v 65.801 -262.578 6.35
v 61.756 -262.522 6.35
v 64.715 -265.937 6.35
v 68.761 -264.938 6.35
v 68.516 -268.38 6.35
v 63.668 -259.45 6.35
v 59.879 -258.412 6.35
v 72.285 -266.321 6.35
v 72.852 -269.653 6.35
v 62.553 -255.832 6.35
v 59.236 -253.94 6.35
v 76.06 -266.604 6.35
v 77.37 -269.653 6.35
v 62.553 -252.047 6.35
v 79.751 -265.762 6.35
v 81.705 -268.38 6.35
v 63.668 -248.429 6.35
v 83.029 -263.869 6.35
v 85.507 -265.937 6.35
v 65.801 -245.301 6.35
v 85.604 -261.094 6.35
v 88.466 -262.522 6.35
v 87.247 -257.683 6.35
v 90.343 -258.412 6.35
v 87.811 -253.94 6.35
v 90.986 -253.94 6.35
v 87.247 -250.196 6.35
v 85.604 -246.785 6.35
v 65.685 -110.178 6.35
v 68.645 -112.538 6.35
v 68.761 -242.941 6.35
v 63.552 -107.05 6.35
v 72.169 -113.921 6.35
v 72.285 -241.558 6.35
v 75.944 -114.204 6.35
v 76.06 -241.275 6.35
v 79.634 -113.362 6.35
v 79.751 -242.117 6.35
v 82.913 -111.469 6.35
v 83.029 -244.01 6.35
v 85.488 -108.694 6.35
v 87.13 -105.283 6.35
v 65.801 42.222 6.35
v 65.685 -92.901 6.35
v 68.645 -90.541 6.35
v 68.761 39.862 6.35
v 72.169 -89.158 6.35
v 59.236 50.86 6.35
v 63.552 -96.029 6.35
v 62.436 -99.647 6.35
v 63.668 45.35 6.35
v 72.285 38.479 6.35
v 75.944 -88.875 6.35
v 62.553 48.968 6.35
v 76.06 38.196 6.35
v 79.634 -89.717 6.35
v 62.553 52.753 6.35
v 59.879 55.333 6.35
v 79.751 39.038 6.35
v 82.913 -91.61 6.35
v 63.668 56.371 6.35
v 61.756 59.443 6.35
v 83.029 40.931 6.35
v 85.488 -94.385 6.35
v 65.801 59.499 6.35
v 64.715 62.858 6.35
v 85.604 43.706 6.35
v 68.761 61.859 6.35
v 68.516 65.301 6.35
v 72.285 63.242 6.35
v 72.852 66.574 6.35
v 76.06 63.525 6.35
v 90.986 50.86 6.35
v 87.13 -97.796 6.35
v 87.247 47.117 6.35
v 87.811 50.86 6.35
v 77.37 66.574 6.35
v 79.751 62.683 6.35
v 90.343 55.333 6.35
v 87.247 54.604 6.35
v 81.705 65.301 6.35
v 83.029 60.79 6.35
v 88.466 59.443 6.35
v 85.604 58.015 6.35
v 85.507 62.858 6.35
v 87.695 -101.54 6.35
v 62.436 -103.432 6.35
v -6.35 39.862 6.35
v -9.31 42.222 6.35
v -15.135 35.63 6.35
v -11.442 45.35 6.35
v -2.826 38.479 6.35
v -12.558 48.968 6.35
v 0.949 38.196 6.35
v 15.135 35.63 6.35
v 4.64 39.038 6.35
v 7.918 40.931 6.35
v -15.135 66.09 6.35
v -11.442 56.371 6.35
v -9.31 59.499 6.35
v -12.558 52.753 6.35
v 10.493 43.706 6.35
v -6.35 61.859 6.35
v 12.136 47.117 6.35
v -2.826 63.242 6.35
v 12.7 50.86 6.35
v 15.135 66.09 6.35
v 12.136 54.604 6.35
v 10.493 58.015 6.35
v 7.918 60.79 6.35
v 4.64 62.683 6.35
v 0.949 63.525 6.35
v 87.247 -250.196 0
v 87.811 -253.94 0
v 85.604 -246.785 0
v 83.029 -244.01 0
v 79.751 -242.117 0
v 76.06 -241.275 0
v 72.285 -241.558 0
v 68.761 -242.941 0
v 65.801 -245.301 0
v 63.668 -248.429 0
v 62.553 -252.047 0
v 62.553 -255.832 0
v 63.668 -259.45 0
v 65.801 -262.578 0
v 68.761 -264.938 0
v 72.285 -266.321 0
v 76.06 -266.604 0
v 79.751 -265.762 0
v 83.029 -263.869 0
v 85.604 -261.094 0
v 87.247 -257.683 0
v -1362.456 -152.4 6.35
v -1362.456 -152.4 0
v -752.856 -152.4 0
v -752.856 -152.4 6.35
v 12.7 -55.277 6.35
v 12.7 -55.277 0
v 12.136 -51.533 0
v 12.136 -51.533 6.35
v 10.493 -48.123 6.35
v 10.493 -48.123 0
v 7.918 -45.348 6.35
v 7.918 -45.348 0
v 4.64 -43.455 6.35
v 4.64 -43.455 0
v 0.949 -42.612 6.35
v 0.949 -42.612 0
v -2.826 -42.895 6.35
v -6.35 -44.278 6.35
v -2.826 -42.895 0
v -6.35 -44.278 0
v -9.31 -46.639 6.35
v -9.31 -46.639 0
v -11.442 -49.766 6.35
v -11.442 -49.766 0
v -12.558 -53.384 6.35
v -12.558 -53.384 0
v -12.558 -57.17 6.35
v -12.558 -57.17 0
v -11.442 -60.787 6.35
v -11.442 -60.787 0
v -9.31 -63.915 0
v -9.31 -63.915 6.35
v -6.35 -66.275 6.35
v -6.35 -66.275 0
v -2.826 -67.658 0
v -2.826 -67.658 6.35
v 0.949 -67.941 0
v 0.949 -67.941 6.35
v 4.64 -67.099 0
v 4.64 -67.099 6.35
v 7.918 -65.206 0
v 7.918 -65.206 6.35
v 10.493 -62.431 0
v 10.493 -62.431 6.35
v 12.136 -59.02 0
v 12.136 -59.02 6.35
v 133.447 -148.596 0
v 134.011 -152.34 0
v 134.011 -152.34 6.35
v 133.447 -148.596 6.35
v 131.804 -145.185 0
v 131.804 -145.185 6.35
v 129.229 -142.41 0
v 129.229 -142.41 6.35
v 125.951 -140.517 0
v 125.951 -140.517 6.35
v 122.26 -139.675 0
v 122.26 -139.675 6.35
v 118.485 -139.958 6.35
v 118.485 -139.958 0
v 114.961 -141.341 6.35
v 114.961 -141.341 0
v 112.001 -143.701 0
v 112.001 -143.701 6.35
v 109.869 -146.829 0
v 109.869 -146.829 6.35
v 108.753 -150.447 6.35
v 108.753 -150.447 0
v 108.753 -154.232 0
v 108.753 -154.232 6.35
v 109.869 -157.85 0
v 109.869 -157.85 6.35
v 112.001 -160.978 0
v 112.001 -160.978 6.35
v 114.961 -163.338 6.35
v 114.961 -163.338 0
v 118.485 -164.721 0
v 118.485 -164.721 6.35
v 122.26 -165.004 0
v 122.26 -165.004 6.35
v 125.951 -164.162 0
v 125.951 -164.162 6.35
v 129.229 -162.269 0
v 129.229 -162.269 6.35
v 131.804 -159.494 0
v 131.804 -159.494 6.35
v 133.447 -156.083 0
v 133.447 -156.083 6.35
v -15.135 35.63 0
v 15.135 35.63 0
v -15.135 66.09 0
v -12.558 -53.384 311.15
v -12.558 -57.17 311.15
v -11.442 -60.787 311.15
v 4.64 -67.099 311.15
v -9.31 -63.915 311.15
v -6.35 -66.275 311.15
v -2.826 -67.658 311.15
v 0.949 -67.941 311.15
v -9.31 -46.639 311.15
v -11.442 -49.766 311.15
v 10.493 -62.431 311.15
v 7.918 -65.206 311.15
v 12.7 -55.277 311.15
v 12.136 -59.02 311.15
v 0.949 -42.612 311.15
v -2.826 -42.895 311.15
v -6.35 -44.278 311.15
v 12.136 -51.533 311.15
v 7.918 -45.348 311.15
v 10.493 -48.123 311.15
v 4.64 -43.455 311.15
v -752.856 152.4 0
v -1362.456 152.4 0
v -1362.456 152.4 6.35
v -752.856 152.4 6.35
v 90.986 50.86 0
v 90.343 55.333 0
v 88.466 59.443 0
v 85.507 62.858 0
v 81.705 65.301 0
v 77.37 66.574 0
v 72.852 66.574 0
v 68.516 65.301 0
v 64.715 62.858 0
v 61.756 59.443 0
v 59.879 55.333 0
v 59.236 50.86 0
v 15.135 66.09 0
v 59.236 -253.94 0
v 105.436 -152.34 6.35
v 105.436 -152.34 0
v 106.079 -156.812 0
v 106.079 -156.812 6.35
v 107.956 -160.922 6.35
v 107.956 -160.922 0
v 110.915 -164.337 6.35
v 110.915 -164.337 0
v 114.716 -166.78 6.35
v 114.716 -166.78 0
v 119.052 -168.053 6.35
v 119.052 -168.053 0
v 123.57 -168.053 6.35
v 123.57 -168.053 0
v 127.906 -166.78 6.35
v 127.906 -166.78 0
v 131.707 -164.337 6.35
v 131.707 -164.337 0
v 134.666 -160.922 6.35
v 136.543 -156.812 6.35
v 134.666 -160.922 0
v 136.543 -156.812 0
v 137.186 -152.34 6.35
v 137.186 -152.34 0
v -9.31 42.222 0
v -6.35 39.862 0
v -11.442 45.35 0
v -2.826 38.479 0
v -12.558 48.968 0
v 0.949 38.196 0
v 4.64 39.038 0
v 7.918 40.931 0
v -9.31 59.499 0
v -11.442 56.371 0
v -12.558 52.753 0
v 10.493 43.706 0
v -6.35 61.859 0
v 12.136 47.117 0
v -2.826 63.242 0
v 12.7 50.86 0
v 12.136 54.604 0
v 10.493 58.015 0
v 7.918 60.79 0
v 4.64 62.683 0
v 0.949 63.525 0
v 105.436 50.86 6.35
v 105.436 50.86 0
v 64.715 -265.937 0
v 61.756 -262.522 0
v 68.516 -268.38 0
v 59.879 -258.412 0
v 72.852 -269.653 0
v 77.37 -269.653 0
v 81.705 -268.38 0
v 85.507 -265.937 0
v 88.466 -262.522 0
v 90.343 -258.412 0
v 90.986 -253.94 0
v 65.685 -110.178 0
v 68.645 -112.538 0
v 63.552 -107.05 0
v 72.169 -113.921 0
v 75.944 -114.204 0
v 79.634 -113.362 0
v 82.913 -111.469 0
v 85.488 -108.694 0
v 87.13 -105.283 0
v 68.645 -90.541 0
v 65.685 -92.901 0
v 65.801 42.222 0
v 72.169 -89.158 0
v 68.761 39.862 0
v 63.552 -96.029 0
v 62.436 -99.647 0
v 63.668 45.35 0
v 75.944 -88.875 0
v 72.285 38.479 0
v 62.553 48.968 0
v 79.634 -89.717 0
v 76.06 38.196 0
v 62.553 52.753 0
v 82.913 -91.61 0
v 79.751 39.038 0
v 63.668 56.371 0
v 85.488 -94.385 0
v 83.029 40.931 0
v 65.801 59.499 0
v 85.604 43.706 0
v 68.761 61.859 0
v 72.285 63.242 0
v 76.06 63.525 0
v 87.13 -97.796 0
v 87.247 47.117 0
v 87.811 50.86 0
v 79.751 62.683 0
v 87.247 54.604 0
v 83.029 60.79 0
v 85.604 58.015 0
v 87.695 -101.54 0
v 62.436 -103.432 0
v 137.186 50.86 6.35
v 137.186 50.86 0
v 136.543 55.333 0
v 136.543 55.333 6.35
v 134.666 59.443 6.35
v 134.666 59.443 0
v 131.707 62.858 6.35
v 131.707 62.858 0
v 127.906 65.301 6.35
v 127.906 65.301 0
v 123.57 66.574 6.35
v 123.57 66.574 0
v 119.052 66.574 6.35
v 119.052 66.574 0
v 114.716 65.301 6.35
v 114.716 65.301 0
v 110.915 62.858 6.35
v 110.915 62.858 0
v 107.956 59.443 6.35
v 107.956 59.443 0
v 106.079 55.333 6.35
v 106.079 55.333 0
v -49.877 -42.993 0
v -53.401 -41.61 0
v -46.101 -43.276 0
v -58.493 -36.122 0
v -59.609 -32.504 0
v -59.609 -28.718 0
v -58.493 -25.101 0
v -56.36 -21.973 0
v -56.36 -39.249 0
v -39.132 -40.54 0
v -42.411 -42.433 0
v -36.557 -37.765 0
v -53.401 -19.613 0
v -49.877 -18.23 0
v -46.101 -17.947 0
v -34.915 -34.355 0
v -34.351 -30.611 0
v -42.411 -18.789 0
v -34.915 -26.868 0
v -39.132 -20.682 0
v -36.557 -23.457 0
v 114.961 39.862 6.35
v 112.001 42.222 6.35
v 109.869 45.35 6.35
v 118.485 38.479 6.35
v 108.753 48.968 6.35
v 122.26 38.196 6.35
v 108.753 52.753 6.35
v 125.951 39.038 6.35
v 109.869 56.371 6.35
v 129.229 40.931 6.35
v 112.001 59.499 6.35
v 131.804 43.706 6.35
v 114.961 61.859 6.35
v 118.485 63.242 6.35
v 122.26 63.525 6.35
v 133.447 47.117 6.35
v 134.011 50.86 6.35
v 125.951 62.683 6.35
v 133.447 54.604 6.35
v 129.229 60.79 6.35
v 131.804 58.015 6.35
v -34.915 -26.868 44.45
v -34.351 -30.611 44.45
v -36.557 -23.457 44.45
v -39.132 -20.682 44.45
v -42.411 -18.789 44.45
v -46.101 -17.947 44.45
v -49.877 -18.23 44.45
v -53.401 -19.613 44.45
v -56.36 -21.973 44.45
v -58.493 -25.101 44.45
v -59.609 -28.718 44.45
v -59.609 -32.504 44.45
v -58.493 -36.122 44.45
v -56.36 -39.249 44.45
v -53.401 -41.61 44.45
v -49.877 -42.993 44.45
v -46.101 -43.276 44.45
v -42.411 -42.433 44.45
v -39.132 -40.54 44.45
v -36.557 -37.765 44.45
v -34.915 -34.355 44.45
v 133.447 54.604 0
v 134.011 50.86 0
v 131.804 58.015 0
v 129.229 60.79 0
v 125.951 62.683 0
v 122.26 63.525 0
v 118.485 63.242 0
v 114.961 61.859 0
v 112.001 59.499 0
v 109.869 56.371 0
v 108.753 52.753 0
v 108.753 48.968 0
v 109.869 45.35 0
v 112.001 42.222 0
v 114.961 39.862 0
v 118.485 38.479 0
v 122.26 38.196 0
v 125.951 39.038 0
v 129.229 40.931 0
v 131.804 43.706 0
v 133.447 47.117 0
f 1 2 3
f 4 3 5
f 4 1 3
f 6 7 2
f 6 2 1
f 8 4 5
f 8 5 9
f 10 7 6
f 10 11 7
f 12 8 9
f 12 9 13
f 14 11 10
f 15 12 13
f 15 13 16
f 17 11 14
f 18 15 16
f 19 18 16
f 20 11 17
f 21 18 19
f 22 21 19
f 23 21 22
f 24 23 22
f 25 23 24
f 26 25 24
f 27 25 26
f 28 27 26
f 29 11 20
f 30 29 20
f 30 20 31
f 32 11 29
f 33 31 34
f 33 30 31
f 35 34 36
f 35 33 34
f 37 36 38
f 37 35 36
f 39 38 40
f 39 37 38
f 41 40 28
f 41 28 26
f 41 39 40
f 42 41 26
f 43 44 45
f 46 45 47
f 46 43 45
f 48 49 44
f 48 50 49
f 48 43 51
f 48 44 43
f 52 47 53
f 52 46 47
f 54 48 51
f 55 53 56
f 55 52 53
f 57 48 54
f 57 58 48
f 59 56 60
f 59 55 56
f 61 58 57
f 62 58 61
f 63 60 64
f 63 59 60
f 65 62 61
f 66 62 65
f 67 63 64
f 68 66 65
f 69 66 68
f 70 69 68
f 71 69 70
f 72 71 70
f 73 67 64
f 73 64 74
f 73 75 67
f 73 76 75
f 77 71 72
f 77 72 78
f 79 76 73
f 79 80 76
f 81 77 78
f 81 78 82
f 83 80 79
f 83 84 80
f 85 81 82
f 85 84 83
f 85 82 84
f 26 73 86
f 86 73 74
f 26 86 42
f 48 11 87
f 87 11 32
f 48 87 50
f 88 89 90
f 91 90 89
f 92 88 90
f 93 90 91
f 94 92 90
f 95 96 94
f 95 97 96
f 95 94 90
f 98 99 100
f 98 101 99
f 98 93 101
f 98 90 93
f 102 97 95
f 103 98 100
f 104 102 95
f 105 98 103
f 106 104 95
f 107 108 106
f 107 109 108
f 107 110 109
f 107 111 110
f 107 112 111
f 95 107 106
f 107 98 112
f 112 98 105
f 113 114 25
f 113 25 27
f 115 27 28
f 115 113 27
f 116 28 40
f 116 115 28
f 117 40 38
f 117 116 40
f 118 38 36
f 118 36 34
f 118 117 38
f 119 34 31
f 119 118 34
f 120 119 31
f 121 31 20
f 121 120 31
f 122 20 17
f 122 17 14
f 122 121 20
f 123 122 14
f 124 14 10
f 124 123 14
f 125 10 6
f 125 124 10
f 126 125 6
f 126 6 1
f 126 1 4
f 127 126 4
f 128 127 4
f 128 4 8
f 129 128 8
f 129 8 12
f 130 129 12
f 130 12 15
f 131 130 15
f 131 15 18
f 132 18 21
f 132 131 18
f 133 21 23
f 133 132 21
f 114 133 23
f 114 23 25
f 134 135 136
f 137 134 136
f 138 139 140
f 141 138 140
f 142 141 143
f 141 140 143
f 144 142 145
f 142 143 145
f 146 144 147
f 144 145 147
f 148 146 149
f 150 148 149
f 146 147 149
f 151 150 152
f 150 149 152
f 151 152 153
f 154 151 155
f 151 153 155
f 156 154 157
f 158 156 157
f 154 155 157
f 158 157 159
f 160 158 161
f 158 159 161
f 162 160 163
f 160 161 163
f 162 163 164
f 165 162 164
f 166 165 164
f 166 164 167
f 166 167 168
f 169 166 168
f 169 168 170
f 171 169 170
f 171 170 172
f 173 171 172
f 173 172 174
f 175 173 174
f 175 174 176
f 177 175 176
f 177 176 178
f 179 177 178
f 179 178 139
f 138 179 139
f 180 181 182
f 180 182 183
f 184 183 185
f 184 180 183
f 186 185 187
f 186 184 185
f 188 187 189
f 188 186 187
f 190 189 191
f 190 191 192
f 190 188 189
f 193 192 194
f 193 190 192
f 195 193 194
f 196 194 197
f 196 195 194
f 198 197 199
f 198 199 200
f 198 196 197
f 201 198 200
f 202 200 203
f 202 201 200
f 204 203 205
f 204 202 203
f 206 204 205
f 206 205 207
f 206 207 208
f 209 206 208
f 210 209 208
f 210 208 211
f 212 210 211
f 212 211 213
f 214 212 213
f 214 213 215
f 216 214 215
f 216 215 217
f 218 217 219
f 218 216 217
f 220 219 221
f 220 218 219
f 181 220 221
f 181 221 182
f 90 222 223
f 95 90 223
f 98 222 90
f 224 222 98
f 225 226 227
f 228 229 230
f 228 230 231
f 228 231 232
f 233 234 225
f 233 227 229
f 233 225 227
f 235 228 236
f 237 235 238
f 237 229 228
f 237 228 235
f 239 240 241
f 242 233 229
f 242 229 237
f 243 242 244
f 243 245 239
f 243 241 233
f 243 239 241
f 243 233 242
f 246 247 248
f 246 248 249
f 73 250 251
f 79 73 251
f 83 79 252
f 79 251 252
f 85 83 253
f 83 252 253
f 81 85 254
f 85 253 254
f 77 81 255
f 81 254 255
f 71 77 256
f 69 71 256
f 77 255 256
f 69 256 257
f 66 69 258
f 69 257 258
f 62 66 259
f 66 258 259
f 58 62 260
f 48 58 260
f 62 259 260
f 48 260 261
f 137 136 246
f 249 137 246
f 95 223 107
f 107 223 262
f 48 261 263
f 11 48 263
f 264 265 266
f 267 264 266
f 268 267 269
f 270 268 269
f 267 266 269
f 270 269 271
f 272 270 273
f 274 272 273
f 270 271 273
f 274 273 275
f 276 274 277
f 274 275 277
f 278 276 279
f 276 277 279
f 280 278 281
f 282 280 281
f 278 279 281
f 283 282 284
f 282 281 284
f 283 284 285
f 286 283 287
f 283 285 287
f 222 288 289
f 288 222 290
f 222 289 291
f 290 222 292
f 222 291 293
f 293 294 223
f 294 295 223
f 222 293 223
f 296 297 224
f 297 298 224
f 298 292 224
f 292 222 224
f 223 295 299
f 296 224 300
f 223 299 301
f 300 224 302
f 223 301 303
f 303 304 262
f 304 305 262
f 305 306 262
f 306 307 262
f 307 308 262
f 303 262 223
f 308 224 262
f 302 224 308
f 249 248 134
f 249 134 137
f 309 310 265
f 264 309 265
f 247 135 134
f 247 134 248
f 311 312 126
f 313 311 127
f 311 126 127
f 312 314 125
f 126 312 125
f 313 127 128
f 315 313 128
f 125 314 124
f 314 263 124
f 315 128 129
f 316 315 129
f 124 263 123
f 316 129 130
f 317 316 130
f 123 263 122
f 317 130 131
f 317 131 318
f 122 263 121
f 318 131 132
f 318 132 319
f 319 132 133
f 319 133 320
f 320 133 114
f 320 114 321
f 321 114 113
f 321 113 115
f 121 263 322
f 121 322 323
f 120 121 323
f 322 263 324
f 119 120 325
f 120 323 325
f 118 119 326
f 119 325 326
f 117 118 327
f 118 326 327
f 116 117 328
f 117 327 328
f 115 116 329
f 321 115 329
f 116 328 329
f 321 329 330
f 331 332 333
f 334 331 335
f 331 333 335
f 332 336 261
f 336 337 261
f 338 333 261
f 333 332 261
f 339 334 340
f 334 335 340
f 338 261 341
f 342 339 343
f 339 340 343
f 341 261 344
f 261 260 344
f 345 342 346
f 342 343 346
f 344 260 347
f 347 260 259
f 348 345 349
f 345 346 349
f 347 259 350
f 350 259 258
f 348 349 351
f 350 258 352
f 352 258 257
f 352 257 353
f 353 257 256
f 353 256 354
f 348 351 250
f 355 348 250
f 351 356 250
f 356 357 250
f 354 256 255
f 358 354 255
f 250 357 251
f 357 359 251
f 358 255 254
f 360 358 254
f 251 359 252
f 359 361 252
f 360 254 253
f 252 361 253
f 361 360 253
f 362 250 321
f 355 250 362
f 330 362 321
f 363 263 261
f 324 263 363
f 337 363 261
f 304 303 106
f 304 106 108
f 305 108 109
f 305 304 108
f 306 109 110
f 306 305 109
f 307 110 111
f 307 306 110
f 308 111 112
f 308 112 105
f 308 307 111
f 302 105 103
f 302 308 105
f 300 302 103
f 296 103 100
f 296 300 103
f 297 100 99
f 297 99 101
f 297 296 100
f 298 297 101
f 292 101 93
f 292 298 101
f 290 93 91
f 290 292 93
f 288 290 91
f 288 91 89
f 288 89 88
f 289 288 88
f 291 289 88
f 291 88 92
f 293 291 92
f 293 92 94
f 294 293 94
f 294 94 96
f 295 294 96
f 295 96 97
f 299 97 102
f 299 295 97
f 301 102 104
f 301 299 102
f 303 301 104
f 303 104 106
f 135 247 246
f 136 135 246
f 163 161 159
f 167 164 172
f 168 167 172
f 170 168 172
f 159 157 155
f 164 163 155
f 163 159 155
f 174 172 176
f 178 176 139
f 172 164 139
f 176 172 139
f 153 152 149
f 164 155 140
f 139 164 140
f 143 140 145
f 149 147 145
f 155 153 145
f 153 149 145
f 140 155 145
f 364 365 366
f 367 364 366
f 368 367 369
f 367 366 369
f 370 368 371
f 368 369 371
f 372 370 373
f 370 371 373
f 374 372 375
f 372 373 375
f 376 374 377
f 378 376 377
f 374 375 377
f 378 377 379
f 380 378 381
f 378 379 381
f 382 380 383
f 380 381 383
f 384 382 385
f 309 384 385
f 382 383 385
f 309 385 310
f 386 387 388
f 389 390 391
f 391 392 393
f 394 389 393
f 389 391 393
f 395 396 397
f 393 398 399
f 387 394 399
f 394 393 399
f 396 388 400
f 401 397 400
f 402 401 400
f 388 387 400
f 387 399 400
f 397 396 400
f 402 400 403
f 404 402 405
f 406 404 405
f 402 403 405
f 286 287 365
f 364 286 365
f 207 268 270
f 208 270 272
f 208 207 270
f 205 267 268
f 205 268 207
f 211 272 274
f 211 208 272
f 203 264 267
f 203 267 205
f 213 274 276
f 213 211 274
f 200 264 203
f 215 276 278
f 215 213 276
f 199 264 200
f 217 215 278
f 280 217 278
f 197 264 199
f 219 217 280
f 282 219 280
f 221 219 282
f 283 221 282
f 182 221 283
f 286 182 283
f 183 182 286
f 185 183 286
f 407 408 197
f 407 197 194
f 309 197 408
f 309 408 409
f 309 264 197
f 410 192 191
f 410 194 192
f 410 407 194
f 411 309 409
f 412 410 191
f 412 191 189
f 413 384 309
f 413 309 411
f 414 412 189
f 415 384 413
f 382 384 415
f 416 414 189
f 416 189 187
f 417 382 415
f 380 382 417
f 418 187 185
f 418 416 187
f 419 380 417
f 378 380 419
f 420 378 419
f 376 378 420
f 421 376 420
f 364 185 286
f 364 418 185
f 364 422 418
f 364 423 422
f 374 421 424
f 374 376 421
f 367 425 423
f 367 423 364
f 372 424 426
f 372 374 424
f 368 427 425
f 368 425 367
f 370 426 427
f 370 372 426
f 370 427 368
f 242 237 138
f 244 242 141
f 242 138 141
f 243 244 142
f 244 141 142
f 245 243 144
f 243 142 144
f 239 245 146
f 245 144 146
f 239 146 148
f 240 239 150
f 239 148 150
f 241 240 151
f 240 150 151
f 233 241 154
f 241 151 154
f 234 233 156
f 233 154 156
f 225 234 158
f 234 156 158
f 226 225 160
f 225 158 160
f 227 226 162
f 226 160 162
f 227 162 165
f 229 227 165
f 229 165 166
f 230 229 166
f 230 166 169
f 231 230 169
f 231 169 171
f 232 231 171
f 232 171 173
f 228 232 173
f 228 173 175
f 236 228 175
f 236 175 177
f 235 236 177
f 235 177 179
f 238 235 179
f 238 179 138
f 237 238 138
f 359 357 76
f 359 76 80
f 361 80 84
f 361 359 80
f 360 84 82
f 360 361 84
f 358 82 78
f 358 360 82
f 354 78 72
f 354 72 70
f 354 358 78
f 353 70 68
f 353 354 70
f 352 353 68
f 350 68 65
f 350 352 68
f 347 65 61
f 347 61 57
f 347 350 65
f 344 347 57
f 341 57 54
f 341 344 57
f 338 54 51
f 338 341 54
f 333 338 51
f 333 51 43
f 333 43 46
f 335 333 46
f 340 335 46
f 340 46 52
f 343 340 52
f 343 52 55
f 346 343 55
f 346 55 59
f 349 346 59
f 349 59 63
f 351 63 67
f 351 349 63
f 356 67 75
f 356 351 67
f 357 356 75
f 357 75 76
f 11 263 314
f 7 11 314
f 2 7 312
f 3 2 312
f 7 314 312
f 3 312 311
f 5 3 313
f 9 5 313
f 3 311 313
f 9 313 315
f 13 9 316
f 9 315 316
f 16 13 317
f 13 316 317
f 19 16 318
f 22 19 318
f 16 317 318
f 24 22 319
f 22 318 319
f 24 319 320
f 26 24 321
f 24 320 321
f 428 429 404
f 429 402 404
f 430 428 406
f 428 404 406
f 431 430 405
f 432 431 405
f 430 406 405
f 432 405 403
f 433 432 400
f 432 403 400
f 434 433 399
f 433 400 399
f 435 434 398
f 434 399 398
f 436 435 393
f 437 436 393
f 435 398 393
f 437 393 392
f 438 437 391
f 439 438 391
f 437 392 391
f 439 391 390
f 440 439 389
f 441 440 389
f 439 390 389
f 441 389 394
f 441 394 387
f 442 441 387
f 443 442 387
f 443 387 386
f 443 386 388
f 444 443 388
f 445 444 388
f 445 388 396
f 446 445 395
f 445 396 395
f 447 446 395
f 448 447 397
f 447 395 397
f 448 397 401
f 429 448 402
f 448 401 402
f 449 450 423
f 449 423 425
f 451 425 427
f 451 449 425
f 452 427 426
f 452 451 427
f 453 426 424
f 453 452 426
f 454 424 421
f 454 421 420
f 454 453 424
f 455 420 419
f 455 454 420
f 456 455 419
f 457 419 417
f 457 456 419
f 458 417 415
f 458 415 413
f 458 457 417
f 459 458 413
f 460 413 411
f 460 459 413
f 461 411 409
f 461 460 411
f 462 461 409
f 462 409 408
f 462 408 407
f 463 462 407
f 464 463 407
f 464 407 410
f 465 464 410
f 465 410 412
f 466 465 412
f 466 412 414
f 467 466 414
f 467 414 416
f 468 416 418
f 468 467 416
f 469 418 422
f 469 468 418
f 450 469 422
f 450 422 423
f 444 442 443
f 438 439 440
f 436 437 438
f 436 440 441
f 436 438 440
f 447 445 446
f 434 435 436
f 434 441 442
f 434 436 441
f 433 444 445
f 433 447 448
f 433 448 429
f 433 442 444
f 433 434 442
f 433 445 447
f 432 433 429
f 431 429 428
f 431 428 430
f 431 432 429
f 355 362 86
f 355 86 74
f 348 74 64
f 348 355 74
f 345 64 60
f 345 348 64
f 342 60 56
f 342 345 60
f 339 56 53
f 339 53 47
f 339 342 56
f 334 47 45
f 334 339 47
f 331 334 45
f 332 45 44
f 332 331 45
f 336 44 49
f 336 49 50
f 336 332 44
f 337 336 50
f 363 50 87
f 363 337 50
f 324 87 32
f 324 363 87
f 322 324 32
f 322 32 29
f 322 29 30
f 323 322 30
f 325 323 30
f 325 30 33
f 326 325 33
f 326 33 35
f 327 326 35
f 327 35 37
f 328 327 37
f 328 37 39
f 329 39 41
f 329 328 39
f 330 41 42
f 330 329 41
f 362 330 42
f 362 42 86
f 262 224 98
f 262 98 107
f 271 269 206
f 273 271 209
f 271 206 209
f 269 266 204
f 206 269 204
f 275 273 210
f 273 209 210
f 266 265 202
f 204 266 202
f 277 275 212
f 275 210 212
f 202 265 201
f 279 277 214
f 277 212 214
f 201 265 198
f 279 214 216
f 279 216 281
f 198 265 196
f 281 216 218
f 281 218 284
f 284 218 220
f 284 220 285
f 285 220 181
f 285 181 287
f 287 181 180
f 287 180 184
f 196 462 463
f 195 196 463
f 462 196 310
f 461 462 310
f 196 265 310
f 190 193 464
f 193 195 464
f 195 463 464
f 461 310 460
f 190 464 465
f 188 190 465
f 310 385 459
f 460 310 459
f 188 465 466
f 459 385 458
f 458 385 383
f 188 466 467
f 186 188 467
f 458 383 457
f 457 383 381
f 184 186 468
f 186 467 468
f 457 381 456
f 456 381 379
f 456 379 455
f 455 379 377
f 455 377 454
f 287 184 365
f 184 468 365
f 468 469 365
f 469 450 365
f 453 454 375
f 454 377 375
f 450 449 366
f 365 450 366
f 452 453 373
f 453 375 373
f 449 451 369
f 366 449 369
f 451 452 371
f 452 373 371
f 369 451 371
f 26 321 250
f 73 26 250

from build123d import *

# Parameters (mm, degrees)
F0_R      = 12.7
F0_W      = 30.27069
F0_H      = 30.459884
F1_DEPTH  = 6.35
F1_FACE_R = 12.7
F2_DEPTH  = 38.1
F3_DEPTH  = 304.8
F4_W      = 609.6
F4_H      = 304.8
F5_DEPTH  = 6.35


with BuildPart() as f1:
    # F0 (on Top) → F1 (new body)
    with BuildSketch(Plane.XY):
        with BuildLine():
            Line((137.185989, -152.339567), (137.185989, 50.860433))
            ThreePointArc((137.185989, 50.860433), (121.310989, 34.985433), (105.435989, 50.860433))
            Line((105.435989, 50.860433), (105.435989, -152.339567))
            ThreePointArc((105.435989, -152.339567), (121.310989, -136.464567), (137.185989, -152.339567))
        make_face()
        with BuildLine():
            Line((90.985773, -253.939567), (90.985773, 50.860433))
            ThreePointArc((90.985773, 50.860433), (75.110773, 34.985433), (59.235773, 50.860433))
            Line((59.235773, 50.860433), (59.235773, -253.939567))
            ThreePointArc((59.235773, -253.939567), (75.110773, -238.064567), (90.985773, -253.939567))
        make_face()
        with Locations((74.994609, -101.539567)):
            Circle(F0_R, mode=Mode.SUBTRACT)
        with BuildLine():
            ThreePointArc((59.235773, 50.860433), (75.110773, 34.985433), (90.985773, 50.860433))
            ThreePointArc((90.985773, 50.860433), (75.110773, 66.735433), (59.235773, 50.860433))
        make_face()
        with Locations((75.110773, 50.860433)):
            Circle(F0_R, mode=Mode.SUBTRACT)
        with BuildLine():
            ThreePointArc((105.435989, 50.860433), (121.310989, 34.985433), (137.185989, 50.860433))
            ThreePointArc((137.185989, 50.860433), (121.310989, 66.735433), (105.435989, 50.860433))
        make_face()
        with Locations((121.310989, 50.860433)):
            Circle(F0_R, mode=Mode.SUBTRACT)
        with BuildLine():
            ThreePointArc((105.435989, -152.339567), (121.310989, -168.214567), (137.185989, -152.339567))
            ThreePointArc((137.185989, -152.339567), (121.310989, -136.464567), (105.435989, -152.339567))
        make_face()
        with Locations((121.310989, -152.339567)):
            Circle(F0_R, mode=Mode.SUBTRACT)
        with BuildLine():
            ThreePointArc((59.235773, -253.939567), (75.110773, -269.814567), (90.985773, -253.939567))
            ThreePointArc((90.985773, -253.939567), (75.110773, -238.064567), (59.235773, -253.939567))
        make_face()
        with Locations((75.110773, -253.939567)):
            Circle(F0_R, mode=Mode.SUBTRACT)
        with Locations((0, 50.860433)):
            Rectangle(F0_W, F0_H)
        with Locations((0, 50.860433)):
            Circle(F0_R, mode=Mode.SUBTRACT)
        with Locations((0, -55.276792)):
            Circle(F0_R)
        with Locations((-47.050537, -30.611185)):
            Circle(F0_R)
    extrude(amount=F1_DEPTH)

    # F1_face (on face) → F2 (join)
    with BuildSketch(Plane(origin=(-47.050537, -30.611185, 6.35), x_dir=(1, 0, 0), z_dir=(0, 0, 1))):
        Circle(F1_FACE_R)
    extrude(amount=F2_DEPTH)

    # F1_face (on face) → F3 (join)
    with BuildSketch(Plane(origin=(-47.050537, -30.611185, 6.35), x_dir=(1, 0, 0), z_dir=(0, 0, 1))):
        with Locations((47.050537, -24.665608)):
            Circle(F1_FACE_R)
    extrude(amount=F3_DEPTH)


with BuildPart() as f5:
    # F4 (on Top) → F5 (new body)
    with BuildSketch(Plane.XY):
        with Locations((-1057.655986, 0)):
            Rectangle(F4_W, F4_H)
    extrude(amount=F5_DEPTH)


solid = Compound([f1.part, f5.part])
